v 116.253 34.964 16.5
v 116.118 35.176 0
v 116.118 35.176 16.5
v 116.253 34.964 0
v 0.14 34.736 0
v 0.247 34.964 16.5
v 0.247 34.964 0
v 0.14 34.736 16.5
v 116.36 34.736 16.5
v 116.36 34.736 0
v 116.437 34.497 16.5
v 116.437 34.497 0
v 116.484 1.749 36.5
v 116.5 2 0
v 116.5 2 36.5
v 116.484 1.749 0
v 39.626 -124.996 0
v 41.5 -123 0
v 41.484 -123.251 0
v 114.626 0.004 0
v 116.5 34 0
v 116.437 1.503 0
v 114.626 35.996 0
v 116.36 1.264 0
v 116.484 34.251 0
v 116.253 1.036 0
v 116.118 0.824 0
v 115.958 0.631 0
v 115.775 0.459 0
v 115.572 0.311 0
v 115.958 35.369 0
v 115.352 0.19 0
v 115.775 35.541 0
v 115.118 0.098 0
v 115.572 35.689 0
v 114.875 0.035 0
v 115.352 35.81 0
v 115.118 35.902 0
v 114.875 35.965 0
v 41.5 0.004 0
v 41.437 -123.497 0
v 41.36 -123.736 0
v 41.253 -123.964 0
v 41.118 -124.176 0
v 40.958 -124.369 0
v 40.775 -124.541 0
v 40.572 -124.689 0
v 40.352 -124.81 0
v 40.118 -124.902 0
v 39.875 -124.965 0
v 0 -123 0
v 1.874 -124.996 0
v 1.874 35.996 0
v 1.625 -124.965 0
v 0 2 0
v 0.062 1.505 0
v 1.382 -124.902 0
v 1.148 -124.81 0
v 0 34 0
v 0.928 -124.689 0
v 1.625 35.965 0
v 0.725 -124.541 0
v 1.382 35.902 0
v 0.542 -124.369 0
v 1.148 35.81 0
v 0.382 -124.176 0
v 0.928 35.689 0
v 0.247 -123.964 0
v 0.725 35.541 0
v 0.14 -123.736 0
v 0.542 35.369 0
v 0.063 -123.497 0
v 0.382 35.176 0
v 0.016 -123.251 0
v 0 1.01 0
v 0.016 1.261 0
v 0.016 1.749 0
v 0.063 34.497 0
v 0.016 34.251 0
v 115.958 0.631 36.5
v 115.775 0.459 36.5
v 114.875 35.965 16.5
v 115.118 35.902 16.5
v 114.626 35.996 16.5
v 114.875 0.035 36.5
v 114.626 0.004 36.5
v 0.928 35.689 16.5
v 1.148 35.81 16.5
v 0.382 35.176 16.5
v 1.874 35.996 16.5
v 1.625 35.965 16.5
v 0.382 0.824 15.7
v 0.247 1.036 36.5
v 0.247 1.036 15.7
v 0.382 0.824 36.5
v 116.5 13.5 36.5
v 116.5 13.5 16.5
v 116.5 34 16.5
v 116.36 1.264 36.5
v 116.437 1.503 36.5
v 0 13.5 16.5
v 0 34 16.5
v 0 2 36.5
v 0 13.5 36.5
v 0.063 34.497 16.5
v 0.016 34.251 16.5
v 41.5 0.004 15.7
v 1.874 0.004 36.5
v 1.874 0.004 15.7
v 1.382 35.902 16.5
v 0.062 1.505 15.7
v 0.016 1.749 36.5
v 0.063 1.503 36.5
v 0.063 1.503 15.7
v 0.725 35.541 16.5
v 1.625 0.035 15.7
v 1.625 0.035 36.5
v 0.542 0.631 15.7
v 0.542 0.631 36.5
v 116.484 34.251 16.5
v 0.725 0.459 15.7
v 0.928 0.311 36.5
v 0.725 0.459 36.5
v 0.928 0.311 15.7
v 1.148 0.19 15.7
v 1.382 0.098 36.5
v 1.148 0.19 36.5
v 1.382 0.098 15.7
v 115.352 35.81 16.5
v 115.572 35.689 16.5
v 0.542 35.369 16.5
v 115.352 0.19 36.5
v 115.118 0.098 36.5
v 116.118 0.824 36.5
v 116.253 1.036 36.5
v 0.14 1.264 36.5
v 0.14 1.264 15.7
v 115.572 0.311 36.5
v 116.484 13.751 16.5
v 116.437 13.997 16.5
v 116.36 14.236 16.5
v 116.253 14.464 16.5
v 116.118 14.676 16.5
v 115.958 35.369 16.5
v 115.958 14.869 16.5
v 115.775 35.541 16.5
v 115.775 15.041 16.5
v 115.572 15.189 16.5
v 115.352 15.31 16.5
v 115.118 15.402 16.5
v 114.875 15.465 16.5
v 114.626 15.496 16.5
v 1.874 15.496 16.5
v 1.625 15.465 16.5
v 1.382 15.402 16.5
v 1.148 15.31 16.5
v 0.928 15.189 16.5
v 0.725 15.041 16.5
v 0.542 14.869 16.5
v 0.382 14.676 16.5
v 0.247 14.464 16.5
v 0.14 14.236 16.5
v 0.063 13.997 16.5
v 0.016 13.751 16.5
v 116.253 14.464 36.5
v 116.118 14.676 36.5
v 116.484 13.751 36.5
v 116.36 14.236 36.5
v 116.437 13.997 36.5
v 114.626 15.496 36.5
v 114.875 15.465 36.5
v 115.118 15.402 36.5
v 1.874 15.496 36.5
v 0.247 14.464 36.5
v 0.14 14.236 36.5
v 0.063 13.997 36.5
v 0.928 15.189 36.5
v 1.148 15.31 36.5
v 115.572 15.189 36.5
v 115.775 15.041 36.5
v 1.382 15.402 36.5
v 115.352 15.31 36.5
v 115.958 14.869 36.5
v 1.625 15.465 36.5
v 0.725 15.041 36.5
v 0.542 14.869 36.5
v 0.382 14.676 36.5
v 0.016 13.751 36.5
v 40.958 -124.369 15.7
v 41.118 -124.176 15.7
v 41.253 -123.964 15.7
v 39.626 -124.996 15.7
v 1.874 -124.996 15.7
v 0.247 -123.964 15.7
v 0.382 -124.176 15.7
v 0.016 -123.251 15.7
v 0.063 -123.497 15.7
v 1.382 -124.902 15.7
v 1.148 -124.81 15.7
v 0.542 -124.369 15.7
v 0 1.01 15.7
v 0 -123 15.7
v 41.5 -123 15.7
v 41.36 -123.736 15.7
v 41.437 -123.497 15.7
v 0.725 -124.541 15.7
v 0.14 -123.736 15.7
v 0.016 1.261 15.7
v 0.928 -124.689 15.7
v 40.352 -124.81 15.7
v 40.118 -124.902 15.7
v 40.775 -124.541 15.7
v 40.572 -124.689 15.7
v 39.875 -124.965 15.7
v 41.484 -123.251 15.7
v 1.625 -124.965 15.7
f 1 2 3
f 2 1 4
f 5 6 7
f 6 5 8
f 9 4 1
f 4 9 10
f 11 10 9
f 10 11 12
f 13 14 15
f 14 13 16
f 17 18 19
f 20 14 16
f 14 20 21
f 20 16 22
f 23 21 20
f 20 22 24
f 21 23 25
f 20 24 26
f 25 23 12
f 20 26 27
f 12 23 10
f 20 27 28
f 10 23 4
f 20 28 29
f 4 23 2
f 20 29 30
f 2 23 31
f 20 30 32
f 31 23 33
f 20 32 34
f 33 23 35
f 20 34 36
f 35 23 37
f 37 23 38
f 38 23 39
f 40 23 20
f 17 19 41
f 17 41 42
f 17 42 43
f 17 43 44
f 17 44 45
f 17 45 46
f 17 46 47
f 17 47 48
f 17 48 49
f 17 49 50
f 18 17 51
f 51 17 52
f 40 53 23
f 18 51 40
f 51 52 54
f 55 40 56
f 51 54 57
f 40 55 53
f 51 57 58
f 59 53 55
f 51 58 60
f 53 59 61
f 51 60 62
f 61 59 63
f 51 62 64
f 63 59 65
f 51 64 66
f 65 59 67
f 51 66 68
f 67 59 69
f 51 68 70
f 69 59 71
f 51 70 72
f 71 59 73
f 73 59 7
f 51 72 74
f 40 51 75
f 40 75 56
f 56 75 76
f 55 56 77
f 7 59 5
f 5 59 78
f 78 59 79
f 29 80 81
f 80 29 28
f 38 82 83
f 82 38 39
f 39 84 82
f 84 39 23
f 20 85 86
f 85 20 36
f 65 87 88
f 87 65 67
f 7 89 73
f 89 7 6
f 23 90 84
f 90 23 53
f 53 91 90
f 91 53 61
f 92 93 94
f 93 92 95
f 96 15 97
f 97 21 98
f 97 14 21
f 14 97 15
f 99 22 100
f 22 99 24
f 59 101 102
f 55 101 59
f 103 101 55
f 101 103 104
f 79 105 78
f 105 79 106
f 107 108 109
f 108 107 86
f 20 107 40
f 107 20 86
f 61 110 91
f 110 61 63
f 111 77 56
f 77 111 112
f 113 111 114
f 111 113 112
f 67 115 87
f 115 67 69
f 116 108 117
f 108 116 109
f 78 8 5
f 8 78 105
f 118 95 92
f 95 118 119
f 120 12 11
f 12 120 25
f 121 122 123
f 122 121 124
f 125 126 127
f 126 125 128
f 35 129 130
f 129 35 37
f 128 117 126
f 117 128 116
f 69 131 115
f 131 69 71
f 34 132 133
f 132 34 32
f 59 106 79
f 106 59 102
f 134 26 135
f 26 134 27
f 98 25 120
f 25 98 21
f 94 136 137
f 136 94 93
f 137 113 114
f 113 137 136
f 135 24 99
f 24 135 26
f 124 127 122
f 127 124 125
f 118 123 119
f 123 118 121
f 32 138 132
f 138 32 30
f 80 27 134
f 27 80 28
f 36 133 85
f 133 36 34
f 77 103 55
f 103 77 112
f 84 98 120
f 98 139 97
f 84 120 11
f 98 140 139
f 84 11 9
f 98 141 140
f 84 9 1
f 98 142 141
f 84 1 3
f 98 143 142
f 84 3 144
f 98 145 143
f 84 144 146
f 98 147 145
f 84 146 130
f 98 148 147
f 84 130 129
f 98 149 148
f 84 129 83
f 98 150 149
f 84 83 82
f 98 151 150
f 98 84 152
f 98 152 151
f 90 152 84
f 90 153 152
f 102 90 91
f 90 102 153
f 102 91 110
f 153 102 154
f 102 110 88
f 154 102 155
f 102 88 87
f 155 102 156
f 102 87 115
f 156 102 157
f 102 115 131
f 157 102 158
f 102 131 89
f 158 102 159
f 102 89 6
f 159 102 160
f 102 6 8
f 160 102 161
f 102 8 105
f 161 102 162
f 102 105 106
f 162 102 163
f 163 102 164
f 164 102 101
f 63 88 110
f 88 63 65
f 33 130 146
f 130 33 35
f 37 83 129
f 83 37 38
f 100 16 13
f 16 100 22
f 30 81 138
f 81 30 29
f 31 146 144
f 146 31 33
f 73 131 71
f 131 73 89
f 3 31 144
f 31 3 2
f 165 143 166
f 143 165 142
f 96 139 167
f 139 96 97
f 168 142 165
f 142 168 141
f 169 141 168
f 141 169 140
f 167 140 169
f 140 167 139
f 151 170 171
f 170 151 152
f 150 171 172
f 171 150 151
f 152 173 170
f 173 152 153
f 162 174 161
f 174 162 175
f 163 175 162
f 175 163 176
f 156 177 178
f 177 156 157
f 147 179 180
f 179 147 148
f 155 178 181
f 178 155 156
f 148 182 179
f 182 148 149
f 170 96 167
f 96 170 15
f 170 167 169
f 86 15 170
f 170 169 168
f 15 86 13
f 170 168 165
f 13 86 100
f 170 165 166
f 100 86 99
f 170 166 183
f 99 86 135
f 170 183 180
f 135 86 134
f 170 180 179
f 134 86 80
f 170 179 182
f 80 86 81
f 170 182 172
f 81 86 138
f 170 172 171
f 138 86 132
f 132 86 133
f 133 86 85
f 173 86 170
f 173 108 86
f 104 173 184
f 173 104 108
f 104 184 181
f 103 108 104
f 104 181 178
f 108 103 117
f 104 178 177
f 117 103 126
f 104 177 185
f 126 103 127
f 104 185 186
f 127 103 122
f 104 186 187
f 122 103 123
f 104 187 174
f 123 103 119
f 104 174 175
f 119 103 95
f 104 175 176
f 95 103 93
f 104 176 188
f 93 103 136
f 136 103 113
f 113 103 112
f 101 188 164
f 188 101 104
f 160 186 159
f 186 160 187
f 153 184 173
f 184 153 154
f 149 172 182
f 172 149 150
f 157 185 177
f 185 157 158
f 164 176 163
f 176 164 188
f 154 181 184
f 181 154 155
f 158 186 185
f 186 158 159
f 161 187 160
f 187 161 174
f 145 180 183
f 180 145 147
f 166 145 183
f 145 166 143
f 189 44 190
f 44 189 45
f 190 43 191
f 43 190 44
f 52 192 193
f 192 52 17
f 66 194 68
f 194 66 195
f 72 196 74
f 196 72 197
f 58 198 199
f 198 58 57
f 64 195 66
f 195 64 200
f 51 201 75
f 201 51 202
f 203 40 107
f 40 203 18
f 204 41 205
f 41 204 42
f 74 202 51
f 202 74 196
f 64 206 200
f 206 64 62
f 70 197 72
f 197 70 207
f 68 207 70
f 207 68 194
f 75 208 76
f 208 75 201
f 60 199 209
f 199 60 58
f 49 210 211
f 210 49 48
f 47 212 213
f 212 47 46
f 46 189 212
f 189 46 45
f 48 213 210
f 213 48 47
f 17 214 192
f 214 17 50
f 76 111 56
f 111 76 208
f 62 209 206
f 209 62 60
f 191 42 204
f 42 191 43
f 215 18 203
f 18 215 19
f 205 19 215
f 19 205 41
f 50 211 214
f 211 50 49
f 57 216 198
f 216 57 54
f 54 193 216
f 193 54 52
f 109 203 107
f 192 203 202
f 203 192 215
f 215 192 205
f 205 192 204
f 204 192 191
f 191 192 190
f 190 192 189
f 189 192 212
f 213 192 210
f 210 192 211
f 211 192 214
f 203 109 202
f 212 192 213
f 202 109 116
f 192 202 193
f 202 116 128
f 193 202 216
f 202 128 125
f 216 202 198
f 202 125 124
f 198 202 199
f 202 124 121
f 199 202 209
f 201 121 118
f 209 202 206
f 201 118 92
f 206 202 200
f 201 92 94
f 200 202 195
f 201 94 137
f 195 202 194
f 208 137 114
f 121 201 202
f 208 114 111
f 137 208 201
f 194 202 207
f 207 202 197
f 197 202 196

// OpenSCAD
// file: ../../lib/config/constants.scad
// Shared constants reflect things that are true for the whole model not just a single component.
// They should by definition be required by multiple components.
$fn = 10;

$abs_filament = false;

$wall_thickness = 2;
$wall_rect = [$wall_thickness, $wall_thickness];
$inner_wall_thickness = 1;

$bleed = 0.01;

$padding = 0.5;
$padding_rect = [$padding * 2, $padding * 2];

$card_padding = 1.5;

$inset = 6;
$cutout_fraction = 0.6;

$rounding = 3;

// TODO are both needed?
$lid_height = 2;
$cutout_lid_height = 2;

$trapezoid_inset = 1;
// file: ../../lib/primitive/rounded_square.scad
include <../config/constants.scad>

module rounded_square(size, flat_top=false, flat_bottom=false) {
  assert(!(flat_top && flat_bottom), "Flat top and flat bottom are exclusive");

  rounding_height = flat_top || flat_bottom 
    ? $rounding 
    : $rounding * 2;

  offset = flat_bottom ? 0 : $rounding;

  inner_size = [
    size[0] - $rounding * 2,
    size[1] - rounding_height,
  ];

  minkowski() {
    translate([$rounding, offset]) {
      square(inner_size);
    }
    if (flat_top ) {
      difference() {
        circle($rounding);
        translate([-$rounding, 0]) {
          square([$rounding * 2, $rounding]);
        }
      }
    } else if (flat_bottom) {
      difference() {
        circle($rounding);
        translate([-$rounding, -$rounding]) {
          square([$rounding * 2, $rounding]);
        }
      }
    } else {
      circle($rounding);
    }
  }
}
// file: ../../lib/layout/layout.scad
include <../config/constants.scad>

function stack_height (size, count=1) = size * count + $padding;

function padded_offset (length, index=1) = (length + $padding * 2 + $wall_thickness) * index;

function offset (size, index=1) = (size + $wall_thickness) * index;

function pad (size) = size + $padding * 2;

function divide_rect(rect, operand) = [rect[0] / operand, rect[1] / operand];
function multiply_rect(rect, operand) = [rect[0] * operand, rect[1] * operand];

function divide_cube(rect, operand) = [rect[0] / operand, rect[1] / operand, rec[2] / operand];
function multiply_cube(rect, operand) = [rect[0] * operand, rect[1] * operand, rect[2] * operand];

function offset_centre_in_box(size, bounding_box) = divide_rect(bounding_box - size, 2);

module offset_cylinder(d, h) {
  translate([d / 2, d / 2, 0]) {
    cylinder(d=d, h=h);
  }
}

module offset_circle(d) {
  translate([d / 2, d / 2, 0]) {
    circle(d=d);
  }
}

module offset_square(size, center=false) {
  translate([size[0] / 2, size[1] / 2, 0]) {
    square(size, center=center);
  }
}
// file: ../../lib/primitive/rounded_cube.scad
include <./rounded_square.scad>
include <../config/constants.scad>

// Render a rounded cube
// flat_top: do not round the top edges
// flat_bottom: do not round the bottom edges
// flat: equals flat_top && flat_bottom
// 
// Limitations:
// requires height > $rounding * 2
// flat_top || flat_bottom requires height > $rounding
// flat_top && flat_bottom requires height > $bleed
module rounded_cube(
  size, 
  flat=false, 
  flat_top=false, 
  flat_bottom=false,
  side_rounding=-1
) {
  _flat = flat || (flat_top && flat_bottom);
  _flat_top = flat_top || flat;
  _flat_bottom = flat_bottom || flat;
  _rounding = min($rounding, size[2] / 2);
  _side_rounding = side_rounding > -1 ? side_rounding: $rounding;

  assert(_side_rounding >= $rounding, "side rounding cannot be less than rounding");

  top_height = _flat_top ? 0: _rounding;
  bottom_height = _flat_bottom ? 0: _rounding;

  cube_size = [
    size[0] - _rounding * 2,
    size[1] - _rounding * 2,
    size[2] - (top_height + bottom_height)
  ];

  if (_flat_top && _flat_bottom) {
     linear_extrude(cube_size[2]) {
       rounded_square([size[0], size[1]]);
     }
   } else {
     minkowski() {
       translate([_rounding, _rounding, bottom_height]) {
         if (_side_rounding != _rounding) {
           linear_extrude(cube_size[2]) {
             rounded_square([cube_size[0], cube_size[1]], $rounding=_side_rounding);
           }
         } else {
           cube(cube_size);
         }
       }

       if (_flat_top) {
         difference() {
           sphere(_rounding);
           cylinder(_rounding, _rounding, _rounding);
         }
       } else if (_flat_bottom) {
         difference() {
           sphere(_rounding);
           translate ([0, 0, -_rounding]) {
             cylinder(_rounding, _rounding, _rounding);
           }
         }
       } else {
         sphere(_rounding);
       }
    }
  }
}
// main file
include <../../lib/primitive/rounded_cube.scad>
include <../../lib/layout/layout.scad>

$fn = 50;

// from teotibot.scad
// Player powers
player_power_count = 6;
player_power_size = [
  120,
  80,
  2.2,
];
ai_tile_size = [
  50,
  23.5,
  2.2,
];
// end

base_length = 116.5;
base_width = 36;
base_height = 16.5;

top_length = base_length;
top_width = 15.5;
top_height = 20;

front_length = 41.5;
// using length of teotibot because it is on its side
front_width = padded_offset(player_power_size[0]) + $wall_thickness + $rounding + $bleed;
front_height = stack_height(player_power_size[2], player_power_count) + $wall_thickness;

union() {
  rounded_cube([base_length, base_width, base_height], flat_top=true, flat_bottom=true, $rounding=2);

  translate([0, 0, base_height]) {
    rounded_cube([top_length, top_width, top_height], flat_top=true, flat_bottom=true, $rounding=2);
  }

  translate([0, -front_width + $rounding + $bleed, 0]) {
    rounded_cube([front_length, front_width, front_height], flat_top=true, flat_bottom=true, $rounding=2);
  }
}
